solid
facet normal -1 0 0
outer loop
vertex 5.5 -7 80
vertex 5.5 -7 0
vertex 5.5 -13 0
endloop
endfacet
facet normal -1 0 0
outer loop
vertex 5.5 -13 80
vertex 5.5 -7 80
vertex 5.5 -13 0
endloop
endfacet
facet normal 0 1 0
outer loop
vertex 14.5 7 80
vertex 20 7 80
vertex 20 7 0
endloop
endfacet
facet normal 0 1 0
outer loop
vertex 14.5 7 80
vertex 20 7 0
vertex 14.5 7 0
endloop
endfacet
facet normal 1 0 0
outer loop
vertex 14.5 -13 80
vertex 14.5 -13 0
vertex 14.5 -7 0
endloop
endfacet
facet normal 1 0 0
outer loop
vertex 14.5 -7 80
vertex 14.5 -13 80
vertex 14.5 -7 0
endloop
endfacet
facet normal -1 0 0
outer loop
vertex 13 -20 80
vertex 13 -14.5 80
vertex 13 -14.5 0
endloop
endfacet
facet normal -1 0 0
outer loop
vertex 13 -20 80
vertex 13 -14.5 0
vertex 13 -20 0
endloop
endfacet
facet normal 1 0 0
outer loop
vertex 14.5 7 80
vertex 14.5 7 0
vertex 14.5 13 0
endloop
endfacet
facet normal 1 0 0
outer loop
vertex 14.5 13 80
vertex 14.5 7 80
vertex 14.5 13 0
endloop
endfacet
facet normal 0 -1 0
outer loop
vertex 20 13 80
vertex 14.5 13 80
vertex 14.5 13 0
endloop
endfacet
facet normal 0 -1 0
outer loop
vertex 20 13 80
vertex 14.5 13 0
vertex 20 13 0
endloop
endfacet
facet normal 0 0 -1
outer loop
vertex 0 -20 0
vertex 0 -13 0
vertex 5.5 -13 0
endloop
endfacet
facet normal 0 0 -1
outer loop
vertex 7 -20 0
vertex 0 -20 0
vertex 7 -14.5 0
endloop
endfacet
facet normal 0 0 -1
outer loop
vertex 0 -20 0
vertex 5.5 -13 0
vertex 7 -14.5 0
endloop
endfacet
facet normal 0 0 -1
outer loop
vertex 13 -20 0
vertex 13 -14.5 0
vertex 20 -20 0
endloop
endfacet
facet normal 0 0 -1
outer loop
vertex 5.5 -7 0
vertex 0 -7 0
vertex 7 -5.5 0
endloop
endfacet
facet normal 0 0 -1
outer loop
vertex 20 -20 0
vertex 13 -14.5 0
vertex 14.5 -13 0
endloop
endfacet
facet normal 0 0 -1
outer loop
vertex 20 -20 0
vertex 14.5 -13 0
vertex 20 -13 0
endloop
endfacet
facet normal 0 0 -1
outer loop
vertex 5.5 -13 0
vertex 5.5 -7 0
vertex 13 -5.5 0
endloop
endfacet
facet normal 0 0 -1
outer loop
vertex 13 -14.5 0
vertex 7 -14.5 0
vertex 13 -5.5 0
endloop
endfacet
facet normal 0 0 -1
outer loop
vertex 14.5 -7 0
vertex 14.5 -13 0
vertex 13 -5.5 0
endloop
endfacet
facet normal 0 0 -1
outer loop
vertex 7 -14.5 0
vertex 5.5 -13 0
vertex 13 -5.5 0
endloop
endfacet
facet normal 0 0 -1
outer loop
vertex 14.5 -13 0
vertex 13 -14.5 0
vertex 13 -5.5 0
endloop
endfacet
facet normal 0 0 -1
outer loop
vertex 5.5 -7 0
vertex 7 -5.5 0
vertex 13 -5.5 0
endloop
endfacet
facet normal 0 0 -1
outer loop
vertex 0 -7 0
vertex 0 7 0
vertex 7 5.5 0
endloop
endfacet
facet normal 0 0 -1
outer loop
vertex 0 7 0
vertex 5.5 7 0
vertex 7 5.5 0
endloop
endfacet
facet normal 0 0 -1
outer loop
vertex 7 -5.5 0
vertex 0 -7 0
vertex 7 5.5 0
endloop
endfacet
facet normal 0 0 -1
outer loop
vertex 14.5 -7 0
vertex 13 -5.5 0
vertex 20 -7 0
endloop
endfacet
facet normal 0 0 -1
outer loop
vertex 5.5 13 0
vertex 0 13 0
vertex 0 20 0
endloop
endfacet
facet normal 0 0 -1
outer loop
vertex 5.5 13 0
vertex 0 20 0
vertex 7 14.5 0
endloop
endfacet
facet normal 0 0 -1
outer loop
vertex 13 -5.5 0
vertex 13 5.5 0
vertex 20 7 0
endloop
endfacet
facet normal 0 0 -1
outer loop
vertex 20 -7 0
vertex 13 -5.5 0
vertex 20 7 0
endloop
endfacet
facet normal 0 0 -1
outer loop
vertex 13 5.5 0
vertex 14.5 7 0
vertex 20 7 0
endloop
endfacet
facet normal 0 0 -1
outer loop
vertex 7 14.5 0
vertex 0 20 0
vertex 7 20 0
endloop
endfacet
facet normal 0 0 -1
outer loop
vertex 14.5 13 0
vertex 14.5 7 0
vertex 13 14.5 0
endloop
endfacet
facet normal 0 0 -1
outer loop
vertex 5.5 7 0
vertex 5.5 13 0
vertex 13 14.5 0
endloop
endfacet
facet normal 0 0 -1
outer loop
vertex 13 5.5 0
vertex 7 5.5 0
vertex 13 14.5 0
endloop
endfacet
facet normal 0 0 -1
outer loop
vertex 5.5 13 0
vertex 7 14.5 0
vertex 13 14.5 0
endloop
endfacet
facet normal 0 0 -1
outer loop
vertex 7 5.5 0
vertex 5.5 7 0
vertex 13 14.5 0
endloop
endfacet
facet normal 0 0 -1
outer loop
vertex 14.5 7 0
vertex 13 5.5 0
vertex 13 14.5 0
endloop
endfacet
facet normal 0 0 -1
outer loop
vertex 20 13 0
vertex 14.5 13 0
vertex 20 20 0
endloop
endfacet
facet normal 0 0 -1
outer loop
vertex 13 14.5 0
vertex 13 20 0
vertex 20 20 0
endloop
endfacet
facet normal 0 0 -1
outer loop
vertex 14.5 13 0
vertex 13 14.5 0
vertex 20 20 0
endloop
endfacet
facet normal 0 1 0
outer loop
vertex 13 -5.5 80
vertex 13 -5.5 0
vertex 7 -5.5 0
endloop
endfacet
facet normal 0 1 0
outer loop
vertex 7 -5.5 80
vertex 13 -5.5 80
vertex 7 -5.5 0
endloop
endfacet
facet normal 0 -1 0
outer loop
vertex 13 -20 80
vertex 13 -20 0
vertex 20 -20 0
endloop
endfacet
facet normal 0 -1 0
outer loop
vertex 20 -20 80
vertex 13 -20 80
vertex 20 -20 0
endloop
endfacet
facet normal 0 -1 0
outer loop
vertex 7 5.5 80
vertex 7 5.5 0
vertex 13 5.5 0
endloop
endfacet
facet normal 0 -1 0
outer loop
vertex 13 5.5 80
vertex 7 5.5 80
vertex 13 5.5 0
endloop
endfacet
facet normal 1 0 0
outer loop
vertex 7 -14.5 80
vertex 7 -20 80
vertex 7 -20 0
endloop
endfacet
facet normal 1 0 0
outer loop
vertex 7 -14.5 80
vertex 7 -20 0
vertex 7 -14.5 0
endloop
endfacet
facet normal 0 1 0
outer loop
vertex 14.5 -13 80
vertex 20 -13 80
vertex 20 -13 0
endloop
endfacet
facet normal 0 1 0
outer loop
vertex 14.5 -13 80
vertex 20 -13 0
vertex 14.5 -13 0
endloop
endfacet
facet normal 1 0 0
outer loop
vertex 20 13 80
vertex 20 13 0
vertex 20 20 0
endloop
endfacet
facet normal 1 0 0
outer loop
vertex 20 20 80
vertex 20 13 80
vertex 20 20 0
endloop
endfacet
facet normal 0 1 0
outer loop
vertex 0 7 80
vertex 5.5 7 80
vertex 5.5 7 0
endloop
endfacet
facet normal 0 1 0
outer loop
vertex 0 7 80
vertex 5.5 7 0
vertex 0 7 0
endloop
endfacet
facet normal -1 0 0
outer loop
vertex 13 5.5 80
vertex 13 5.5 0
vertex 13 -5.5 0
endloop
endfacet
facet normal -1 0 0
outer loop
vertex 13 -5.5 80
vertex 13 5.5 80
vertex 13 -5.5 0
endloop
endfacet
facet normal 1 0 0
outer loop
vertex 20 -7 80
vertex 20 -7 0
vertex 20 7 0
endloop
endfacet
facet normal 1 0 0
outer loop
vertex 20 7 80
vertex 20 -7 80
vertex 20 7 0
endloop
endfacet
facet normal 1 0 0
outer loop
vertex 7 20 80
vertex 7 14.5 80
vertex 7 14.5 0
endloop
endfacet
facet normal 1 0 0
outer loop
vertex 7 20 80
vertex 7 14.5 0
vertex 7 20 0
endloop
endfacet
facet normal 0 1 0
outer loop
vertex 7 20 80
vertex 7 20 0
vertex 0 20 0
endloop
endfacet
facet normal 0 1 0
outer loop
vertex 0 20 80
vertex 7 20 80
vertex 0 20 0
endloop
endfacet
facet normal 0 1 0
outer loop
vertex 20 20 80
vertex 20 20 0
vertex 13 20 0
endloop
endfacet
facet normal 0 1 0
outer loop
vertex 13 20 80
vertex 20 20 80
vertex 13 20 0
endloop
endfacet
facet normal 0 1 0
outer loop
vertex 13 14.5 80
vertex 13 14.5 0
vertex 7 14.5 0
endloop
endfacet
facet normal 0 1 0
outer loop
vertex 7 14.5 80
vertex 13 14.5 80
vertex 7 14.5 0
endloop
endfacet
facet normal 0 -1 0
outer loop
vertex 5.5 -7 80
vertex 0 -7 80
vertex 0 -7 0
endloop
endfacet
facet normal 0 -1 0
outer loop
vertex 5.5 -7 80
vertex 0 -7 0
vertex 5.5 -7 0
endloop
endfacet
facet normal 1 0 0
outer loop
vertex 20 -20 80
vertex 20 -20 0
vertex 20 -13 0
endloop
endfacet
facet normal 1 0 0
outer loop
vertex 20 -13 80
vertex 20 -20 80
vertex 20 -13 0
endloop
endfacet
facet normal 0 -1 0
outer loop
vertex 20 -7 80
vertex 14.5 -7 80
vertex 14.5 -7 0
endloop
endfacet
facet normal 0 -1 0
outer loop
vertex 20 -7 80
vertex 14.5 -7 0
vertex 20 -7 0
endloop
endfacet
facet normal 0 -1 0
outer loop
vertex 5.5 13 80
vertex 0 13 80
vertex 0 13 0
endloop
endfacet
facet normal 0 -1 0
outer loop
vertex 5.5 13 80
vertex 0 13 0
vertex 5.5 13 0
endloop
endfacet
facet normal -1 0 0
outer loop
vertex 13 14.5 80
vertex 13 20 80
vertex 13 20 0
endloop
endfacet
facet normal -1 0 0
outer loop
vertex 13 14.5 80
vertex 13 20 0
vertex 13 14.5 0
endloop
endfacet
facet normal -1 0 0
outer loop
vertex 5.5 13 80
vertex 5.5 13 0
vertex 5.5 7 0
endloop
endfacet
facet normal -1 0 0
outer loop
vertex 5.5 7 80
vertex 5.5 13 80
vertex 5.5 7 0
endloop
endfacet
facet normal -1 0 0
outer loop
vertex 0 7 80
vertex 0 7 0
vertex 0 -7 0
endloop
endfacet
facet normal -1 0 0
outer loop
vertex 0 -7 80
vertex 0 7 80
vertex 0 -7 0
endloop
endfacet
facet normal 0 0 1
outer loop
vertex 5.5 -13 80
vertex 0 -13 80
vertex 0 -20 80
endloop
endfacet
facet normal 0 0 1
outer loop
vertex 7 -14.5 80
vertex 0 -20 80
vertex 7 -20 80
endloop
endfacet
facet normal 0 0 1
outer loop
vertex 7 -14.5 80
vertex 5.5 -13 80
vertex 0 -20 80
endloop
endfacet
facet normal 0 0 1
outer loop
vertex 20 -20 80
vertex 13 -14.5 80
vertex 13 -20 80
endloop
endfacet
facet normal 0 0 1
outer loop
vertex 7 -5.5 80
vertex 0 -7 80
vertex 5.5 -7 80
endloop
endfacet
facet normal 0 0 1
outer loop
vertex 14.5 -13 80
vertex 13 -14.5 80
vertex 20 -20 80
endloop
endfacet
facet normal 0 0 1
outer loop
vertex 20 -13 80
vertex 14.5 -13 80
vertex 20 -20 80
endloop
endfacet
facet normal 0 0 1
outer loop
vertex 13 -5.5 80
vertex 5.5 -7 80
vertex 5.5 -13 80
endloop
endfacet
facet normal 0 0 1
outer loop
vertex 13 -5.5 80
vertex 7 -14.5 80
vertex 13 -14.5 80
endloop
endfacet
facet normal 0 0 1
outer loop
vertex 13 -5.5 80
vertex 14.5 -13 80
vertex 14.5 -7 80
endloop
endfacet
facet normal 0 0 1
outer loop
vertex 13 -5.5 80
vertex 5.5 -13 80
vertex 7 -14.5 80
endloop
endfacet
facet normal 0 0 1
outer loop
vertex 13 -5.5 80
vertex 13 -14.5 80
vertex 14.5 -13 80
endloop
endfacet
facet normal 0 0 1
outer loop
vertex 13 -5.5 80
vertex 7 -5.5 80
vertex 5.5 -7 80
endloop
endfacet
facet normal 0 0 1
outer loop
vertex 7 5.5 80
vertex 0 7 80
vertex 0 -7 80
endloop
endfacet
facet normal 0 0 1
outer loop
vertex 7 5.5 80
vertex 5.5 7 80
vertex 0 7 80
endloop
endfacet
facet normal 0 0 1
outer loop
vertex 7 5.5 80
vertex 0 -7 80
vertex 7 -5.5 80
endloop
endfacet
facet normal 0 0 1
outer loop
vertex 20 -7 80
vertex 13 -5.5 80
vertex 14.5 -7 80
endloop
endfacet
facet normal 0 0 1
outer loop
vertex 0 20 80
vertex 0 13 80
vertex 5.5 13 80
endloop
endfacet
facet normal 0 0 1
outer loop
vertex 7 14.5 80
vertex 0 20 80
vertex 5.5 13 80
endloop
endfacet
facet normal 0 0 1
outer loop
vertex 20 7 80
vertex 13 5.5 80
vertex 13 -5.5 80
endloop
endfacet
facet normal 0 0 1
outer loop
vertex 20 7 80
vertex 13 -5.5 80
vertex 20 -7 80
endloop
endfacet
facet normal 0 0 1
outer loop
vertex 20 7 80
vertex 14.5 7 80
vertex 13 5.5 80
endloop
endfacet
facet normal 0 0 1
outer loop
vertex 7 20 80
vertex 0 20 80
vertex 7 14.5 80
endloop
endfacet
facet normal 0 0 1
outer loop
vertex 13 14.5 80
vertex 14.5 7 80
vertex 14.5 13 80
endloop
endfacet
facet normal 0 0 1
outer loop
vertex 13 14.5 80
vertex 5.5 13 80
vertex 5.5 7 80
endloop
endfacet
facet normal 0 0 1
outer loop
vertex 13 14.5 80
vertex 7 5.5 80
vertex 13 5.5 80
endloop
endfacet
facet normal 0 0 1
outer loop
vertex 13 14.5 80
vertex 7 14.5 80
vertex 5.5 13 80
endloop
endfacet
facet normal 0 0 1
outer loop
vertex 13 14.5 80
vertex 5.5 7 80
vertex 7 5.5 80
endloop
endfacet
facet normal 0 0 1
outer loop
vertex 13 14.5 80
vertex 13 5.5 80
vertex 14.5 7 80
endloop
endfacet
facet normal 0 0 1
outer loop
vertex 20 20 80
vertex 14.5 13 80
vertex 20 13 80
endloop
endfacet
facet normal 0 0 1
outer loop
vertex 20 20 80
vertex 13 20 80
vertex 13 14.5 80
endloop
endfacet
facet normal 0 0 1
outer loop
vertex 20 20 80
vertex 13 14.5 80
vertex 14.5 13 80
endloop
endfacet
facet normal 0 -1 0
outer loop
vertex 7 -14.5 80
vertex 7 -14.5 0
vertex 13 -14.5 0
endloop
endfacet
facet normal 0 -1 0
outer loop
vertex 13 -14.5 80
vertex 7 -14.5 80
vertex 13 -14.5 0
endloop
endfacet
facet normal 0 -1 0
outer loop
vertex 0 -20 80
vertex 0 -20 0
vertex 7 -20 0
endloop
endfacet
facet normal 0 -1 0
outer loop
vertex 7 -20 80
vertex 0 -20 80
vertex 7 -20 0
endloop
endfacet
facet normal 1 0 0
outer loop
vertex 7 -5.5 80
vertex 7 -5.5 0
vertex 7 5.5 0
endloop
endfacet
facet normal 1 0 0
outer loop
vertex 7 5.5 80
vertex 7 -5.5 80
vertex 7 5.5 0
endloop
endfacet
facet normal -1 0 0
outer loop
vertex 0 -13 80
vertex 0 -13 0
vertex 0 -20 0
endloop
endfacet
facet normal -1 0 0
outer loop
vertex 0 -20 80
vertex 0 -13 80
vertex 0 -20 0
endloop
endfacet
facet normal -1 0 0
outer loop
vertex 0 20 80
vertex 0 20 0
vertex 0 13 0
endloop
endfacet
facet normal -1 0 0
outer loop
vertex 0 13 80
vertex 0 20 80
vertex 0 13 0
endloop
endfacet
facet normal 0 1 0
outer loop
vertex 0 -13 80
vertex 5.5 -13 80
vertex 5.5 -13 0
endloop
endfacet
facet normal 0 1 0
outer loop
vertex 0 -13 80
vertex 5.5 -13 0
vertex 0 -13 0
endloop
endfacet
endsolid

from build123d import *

# Parameters (mm, degrees)
F1_DEPTH = 80


with BuildPart() as f1:
    # F0 (on Top) → F1 (new body)
    with BuildSketch(Plane.XY):
        Polygon((0, 7), (0, 0), (7, 0), (7, 5.5), (13, 5.5), (13, 0), (20, 0), (20, 7), (14.5, 7), (14.5, 13), (20, 13), (20, 20), (13, 20), (13, 14.5), (7, 14.5), (7, 20), (0, 20), (0, 13), (5.5, 13), (5.5, 7), align=None)
        Polygon((7, 0), (0, 0), (0, -7), (5.5, -7), (5.5, -13), (0, -13), (0, -20), (7, -20), (7, -14.5), (13, -14.5), (13, -20), (20, -20), (20, -13), (14.5, -13), (14.5, -7), (20, -7), (20, 0), (13, 0), (13, -5.5), (7, -5.5), align=None)
    extrude(amount=F1_DEPTH)


solid = f1.part
